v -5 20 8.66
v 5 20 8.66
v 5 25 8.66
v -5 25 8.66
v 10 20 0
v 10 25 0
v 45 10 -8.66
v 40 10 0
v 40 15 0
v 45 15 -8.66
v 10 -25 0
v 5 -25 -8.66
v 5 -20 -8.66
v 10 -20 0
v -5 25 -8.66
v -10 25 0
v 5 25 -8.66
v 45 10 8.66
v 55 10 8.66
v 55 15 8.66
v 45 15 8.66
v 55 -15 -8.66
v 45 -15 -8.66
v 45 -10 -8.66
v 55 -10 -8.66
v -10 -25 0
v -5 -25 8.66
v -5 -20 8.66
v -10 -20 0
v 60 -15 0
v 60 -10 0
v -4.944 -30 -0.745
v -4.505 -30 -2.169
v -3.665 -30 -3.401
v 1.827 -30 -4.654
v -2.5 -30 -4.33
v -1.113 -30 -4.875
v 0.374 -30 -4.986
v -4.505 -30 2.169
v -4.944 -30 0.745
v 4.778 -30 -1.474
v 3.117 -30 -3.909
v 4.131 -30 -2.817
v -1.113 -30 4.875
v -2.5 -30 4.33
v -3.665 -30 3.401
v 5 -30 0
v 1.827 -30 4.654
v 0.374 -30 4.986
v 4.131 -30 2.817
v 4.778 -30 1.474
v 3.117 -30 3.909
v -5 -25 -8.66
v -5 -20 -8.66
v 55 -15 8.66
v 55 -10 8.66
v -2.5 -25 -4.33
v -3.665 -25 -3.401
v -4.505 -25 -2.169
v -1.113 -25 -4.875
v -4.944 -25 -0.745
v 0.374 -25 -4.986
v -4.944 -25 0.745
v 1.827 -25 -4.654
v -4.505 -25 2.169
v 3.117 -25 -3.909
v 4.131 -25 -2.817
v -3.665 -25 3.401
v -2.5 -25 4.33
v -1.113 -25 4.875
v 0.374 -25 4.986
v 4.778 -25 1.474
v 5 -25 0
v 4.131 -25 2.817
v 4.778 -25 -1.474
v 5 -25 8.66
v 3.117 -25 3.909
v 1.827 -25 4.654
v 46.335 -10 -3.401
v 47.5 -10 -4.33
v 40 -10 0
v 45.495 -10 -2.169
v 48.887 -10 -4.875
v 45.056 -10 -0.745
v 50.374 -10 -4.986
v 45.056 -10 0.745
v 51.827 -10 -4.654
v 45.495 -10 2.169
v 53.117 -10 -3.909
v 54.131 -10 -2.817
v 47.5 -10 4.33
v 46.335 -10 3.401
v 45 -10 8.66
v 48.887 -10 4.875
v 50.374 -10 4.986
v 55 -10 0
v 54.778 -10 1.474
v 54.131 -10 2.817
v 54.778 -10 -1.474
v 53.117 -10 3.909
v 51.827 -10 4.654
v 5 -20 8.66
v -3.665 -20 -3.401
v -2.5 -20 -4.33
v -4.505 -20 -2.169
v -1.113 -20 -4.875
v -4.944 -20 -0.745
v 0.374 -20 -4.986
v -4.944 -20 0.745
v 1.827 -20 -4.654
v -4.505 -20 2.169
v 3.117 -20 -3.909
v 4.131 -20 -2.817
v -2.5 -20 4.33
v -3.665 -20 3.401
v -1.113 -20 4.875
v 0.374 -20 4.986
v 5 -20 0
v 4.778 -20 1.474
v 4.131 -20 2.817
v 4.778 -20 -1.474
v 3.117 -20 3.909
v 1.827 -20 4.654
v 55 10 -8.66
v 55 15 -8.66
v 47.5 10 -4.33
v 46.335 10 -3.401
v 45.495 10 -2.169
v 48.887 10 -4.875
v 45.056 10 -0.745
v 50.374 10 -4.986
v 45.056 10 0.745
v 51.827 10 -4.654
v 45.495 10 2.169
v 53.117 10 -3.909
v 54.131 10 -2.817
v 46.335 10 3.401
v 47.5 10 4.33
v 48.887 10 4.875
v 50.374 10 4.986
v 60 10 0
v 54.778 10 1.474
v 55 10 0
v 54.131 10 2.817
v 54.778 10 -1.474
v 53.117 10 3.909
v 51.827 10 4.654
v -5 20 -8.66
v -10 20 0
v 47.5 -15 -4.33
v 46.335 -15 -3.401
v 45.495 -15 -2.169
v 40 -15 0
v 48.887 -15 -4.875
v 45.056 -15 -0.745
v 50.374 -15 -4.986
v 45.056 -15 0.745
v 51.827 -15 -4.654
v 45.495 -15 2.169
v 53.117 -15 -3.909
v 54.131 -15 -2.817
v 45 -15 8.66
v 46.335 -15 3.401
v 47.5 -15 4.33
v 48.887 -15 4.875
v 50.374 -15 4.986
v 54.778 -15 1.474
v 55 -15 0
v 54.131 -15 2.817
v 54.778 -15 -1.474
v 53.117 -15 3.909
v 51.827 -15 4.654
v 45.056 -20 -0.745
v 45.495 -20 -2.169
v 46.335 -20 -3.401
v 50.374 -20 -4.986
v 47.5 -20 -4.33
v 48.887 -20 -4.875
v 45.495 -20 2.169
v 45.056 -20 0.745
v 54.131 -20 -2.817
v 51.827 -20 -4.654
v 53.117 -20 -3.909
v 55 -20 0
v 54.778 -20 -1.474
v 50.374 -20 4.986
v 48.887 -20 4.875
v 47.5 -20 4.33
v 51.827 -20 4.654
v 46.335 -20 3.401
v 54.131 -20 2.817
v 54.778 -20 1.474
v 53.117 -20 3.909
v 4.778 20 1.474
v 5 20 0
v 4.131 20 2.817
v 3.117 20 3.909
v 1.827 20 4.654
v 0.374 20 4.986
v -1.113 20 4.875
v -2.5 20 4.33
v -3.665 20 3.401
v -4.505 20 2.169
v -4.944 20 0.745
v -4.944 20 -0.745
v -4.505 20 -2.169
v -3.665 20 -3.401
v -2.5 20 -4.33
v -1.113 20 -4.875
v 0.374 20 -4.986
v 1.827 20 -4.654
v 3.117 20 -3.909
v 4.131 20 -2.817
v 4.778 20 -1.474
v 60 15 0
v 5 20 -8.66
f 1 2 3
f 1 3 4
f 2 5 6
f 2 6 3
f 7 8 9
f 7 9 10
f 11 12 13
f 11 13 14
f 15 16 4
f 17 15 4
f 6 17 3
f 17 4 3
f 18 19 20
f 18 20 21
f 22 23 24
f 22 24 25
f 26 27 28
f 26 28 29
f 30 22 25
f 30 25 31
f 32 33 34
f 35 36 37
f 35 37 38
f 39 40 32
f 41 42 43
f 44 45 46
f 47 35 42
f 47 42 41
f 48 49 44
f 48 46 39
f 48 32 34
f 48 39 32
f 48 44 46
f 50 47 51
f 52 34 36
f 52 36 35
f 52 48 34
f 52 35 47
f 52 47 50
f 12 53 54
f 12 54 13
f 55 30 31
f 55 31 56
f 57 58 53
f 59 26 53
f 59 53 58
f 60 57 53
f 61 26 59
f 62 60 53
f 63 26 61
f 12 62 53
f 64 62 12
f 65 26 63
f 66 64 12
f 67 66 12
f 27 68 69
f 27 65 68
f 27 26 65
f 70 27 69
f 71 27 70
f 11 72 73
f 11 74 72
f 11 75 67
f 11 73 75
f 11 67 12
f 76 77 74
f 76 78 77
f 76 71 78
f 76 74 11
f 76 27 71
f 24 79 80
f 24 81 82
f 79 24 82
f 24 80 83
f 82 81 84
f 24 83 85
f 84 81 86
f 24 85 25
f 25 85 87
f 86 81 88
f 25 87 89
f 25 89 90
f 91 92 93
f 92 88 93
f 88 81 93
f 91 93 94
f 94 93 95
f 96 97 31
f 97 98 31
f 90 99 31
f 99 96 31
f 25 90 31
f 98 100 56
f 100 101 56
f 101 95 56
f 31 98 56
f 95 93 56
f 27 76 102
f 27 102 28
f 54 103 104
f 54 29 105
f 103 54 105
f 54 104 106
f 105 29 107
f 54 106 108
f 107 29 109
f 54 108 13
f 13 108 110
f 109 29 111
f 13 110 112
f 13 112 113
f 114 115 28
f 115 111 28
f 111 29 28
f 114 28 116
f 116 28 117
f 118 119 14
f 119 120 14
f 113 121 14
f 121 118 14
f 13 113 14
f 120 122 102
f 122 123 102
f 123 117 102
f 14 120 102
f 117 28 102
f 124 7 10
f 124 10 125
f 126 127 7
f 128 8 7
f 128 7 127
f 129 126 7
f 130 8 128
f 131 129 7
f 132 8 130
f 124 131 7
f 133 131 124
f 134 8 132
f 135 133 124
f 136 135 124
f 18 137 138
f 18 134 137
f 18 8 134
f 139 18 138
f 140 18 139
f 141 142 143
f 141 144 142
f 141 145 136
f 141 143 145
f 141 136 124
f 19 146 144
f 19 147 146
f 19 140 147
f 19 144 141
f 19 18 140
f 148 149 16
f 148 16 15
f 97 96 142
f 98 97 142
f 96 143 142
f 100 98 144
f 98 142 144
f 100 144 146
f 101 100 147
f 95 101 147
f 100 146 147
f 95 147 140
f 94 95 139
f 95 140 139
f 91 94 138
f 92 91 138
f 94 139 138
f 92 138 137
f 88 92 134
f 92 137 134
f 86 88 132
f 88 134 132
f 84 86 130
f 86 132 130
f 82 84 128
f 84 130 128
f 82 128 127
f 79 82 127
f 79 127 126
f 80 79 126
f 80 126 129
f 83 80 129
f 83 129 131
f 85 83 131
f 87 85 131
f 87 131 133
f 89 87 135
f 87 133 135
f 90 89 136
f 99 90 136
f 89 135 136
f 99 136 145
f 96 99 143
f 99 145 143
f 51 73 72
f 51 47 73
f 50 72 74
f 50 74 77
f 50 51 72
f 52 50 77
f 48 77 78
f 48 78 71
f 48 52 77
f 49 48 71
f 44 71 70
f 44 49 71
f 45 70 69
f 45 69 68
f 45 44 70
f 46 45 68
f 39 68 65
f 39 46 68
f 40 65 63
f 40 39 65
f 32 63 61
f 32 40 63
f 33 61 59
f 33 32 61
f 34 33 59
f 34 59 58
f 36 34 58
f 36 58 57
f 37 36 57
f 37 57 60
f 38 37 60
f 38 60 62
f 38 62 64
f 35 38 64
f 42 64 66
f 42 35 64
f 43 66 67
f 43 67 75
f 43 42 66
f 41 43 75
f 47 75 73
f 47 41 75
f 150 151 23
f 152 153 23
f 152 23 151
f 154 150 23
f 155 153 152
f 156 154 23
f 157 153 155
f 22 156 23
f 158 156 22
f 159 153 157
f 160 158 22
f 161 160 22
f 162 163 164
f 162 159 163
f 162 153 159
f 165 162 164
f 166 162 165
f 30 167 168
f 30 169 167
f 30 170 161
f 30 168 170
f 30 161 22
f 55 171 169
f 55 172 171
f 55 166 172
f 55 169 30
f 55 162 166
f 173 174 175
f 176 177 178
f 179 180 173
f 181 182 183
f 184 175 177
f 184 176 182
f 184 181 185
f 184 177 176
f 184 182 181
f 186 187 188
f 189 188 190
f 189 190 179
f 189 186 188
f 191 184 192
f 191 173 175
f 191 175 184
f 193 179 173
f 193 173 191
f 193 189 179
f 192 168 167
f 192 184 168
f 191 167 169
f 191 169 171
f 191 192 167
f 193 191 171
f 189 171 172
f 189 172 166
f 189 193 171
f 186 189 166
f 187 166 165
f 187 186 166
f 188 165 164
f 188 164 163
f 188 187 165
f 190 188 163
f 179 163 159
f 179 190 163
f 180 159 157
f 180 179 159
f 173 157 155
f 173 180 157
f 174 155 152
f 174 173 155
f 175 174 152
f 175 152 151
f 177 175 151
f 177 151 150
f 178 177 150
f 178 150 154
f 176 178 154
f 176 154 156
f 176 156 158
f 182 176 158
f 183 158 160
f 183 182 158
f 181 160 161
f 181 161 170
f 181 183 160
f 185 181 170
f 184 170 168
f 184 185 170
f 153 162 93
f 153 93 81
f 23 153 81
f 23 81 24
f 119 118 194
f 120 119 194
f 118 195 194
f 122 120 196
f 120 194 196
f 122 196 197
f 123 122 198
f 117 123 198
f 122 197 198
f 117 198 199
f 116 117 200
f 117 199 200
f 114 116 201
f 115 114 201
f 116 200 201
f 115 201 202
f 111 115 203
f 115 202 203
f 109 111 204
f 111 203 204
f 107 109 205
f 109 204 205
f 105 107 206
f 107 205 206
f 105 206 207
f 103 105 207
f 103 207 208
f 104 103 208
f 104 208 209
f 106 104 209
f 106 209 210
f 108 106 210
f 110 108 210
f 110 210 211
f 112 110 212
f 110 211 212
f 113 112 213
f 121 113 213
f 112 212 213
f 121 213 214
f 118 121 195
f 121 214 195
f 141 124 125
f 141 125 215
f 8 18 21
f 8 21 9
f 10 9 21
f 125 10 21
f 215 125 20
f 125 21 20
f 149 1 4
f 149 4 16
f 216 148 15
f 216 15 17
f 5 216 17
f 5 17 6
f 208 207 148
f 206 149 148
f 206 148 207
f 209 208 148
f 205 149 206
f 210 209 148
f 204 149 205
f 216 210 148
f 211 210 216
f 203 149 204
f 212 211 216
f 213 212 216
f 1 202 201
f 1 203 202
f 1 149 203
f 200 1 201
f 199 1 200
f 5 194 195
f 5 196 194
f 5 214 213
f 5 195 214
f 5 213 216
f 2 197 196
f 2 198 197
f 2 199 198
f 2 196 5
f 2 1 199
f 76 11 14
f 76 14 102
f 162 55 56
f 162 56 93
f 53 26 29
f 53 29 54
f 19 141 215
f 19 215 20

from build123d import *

# Parameters (mm, degrees)
F0_R          = 5
F1_DEPTH      = 30
F1_DEPTH_BACK = 25
F2_DEPTH      = 25
F3_DEPTH      = 20
F4_DEPTH      = 20
F4_DEPTH_BACK = 15
F5_DEPTH      = 15
F6_DEPTH      = 10


with BuildPart() as f1:
    # F0 (on Front) → F1 (new body, two sides)
    with BuildSketch(Plane.XZ) as f1_sk:
        Circle(F0_R)
    extrude(amount=F1_DEPTH)
    extrude(f1_sk.sketch, amount=-F1_DEPTH_BACK)

    # F0 (on Front) → F2 (join, symmetric)
    with BuildSketch(Plane.XZ):
        Polygon((5, 8.660254), (-5, 8.660254), (-10, 0), (-5, -8.660254), (5, -8.660254), (10, 0), align=None)
        Circle(F0_R, mode=Mode.SUBTRACT)
    extrude(amount=F2_DEPTH, both=True)

    # F0 (on Front) → F3 (cut, symmetric)
    with BuildSketch(Plane.XZ):
        Polygon((5, 8.660254), (-5, 8.660254), (-10, 0), (-5, -8.660254), (5, -8.660254), (10, 0), align=None)
        Circle(F0_R, mode=Mode.SUBTRACT)
    extrude(amount=F3_DEPTH, both=True, mode=Mode.SUBTRACT)


with BuildPart() as f4:
    # F0 (on Front) → F4 (new body, two sides)
    with BuildSketch(Plane.XZ) as f4_sk:
        with Locations((50, 0)):
            Circle(F0_R)
    extrude(amount=F4_DEPTH)
    extrude(f4_sk.sketch, amount=-F4_DEPTH_BACK)

    # F0 (on Front) → F5 (join, symmetric)
    with BuildSketch(Plane.XZ):
        Polygon((55, 8.660254), (45, 8.660254), (40, 0), (45, -8.660254), (55, -8.660254), (60, 0), align=None)
        with Locations((50, 0)):
            Circle(F0_R, mode=Mode.SUBTRACT)
    extrude(amount=F5_DEPTH, both=True)

    # F0 (on Front) → F6 (cut, symmetric)
    with BuildSketch(Plane.XZ):
        Polygon((55, 8.660254), (45, 8.660254), (40, 0), (45, -8.660254), (55, -8.660254), (60, 0), align=None)
        with Locations((50, 0)):
            Circle(F0_R, mode=Mode.SUBTRACT)
    extrude(amount=F6_DEPTH, both=True, mode=Mode.SUBTRACT)


solid = Compound([f1.part, f4.part])
